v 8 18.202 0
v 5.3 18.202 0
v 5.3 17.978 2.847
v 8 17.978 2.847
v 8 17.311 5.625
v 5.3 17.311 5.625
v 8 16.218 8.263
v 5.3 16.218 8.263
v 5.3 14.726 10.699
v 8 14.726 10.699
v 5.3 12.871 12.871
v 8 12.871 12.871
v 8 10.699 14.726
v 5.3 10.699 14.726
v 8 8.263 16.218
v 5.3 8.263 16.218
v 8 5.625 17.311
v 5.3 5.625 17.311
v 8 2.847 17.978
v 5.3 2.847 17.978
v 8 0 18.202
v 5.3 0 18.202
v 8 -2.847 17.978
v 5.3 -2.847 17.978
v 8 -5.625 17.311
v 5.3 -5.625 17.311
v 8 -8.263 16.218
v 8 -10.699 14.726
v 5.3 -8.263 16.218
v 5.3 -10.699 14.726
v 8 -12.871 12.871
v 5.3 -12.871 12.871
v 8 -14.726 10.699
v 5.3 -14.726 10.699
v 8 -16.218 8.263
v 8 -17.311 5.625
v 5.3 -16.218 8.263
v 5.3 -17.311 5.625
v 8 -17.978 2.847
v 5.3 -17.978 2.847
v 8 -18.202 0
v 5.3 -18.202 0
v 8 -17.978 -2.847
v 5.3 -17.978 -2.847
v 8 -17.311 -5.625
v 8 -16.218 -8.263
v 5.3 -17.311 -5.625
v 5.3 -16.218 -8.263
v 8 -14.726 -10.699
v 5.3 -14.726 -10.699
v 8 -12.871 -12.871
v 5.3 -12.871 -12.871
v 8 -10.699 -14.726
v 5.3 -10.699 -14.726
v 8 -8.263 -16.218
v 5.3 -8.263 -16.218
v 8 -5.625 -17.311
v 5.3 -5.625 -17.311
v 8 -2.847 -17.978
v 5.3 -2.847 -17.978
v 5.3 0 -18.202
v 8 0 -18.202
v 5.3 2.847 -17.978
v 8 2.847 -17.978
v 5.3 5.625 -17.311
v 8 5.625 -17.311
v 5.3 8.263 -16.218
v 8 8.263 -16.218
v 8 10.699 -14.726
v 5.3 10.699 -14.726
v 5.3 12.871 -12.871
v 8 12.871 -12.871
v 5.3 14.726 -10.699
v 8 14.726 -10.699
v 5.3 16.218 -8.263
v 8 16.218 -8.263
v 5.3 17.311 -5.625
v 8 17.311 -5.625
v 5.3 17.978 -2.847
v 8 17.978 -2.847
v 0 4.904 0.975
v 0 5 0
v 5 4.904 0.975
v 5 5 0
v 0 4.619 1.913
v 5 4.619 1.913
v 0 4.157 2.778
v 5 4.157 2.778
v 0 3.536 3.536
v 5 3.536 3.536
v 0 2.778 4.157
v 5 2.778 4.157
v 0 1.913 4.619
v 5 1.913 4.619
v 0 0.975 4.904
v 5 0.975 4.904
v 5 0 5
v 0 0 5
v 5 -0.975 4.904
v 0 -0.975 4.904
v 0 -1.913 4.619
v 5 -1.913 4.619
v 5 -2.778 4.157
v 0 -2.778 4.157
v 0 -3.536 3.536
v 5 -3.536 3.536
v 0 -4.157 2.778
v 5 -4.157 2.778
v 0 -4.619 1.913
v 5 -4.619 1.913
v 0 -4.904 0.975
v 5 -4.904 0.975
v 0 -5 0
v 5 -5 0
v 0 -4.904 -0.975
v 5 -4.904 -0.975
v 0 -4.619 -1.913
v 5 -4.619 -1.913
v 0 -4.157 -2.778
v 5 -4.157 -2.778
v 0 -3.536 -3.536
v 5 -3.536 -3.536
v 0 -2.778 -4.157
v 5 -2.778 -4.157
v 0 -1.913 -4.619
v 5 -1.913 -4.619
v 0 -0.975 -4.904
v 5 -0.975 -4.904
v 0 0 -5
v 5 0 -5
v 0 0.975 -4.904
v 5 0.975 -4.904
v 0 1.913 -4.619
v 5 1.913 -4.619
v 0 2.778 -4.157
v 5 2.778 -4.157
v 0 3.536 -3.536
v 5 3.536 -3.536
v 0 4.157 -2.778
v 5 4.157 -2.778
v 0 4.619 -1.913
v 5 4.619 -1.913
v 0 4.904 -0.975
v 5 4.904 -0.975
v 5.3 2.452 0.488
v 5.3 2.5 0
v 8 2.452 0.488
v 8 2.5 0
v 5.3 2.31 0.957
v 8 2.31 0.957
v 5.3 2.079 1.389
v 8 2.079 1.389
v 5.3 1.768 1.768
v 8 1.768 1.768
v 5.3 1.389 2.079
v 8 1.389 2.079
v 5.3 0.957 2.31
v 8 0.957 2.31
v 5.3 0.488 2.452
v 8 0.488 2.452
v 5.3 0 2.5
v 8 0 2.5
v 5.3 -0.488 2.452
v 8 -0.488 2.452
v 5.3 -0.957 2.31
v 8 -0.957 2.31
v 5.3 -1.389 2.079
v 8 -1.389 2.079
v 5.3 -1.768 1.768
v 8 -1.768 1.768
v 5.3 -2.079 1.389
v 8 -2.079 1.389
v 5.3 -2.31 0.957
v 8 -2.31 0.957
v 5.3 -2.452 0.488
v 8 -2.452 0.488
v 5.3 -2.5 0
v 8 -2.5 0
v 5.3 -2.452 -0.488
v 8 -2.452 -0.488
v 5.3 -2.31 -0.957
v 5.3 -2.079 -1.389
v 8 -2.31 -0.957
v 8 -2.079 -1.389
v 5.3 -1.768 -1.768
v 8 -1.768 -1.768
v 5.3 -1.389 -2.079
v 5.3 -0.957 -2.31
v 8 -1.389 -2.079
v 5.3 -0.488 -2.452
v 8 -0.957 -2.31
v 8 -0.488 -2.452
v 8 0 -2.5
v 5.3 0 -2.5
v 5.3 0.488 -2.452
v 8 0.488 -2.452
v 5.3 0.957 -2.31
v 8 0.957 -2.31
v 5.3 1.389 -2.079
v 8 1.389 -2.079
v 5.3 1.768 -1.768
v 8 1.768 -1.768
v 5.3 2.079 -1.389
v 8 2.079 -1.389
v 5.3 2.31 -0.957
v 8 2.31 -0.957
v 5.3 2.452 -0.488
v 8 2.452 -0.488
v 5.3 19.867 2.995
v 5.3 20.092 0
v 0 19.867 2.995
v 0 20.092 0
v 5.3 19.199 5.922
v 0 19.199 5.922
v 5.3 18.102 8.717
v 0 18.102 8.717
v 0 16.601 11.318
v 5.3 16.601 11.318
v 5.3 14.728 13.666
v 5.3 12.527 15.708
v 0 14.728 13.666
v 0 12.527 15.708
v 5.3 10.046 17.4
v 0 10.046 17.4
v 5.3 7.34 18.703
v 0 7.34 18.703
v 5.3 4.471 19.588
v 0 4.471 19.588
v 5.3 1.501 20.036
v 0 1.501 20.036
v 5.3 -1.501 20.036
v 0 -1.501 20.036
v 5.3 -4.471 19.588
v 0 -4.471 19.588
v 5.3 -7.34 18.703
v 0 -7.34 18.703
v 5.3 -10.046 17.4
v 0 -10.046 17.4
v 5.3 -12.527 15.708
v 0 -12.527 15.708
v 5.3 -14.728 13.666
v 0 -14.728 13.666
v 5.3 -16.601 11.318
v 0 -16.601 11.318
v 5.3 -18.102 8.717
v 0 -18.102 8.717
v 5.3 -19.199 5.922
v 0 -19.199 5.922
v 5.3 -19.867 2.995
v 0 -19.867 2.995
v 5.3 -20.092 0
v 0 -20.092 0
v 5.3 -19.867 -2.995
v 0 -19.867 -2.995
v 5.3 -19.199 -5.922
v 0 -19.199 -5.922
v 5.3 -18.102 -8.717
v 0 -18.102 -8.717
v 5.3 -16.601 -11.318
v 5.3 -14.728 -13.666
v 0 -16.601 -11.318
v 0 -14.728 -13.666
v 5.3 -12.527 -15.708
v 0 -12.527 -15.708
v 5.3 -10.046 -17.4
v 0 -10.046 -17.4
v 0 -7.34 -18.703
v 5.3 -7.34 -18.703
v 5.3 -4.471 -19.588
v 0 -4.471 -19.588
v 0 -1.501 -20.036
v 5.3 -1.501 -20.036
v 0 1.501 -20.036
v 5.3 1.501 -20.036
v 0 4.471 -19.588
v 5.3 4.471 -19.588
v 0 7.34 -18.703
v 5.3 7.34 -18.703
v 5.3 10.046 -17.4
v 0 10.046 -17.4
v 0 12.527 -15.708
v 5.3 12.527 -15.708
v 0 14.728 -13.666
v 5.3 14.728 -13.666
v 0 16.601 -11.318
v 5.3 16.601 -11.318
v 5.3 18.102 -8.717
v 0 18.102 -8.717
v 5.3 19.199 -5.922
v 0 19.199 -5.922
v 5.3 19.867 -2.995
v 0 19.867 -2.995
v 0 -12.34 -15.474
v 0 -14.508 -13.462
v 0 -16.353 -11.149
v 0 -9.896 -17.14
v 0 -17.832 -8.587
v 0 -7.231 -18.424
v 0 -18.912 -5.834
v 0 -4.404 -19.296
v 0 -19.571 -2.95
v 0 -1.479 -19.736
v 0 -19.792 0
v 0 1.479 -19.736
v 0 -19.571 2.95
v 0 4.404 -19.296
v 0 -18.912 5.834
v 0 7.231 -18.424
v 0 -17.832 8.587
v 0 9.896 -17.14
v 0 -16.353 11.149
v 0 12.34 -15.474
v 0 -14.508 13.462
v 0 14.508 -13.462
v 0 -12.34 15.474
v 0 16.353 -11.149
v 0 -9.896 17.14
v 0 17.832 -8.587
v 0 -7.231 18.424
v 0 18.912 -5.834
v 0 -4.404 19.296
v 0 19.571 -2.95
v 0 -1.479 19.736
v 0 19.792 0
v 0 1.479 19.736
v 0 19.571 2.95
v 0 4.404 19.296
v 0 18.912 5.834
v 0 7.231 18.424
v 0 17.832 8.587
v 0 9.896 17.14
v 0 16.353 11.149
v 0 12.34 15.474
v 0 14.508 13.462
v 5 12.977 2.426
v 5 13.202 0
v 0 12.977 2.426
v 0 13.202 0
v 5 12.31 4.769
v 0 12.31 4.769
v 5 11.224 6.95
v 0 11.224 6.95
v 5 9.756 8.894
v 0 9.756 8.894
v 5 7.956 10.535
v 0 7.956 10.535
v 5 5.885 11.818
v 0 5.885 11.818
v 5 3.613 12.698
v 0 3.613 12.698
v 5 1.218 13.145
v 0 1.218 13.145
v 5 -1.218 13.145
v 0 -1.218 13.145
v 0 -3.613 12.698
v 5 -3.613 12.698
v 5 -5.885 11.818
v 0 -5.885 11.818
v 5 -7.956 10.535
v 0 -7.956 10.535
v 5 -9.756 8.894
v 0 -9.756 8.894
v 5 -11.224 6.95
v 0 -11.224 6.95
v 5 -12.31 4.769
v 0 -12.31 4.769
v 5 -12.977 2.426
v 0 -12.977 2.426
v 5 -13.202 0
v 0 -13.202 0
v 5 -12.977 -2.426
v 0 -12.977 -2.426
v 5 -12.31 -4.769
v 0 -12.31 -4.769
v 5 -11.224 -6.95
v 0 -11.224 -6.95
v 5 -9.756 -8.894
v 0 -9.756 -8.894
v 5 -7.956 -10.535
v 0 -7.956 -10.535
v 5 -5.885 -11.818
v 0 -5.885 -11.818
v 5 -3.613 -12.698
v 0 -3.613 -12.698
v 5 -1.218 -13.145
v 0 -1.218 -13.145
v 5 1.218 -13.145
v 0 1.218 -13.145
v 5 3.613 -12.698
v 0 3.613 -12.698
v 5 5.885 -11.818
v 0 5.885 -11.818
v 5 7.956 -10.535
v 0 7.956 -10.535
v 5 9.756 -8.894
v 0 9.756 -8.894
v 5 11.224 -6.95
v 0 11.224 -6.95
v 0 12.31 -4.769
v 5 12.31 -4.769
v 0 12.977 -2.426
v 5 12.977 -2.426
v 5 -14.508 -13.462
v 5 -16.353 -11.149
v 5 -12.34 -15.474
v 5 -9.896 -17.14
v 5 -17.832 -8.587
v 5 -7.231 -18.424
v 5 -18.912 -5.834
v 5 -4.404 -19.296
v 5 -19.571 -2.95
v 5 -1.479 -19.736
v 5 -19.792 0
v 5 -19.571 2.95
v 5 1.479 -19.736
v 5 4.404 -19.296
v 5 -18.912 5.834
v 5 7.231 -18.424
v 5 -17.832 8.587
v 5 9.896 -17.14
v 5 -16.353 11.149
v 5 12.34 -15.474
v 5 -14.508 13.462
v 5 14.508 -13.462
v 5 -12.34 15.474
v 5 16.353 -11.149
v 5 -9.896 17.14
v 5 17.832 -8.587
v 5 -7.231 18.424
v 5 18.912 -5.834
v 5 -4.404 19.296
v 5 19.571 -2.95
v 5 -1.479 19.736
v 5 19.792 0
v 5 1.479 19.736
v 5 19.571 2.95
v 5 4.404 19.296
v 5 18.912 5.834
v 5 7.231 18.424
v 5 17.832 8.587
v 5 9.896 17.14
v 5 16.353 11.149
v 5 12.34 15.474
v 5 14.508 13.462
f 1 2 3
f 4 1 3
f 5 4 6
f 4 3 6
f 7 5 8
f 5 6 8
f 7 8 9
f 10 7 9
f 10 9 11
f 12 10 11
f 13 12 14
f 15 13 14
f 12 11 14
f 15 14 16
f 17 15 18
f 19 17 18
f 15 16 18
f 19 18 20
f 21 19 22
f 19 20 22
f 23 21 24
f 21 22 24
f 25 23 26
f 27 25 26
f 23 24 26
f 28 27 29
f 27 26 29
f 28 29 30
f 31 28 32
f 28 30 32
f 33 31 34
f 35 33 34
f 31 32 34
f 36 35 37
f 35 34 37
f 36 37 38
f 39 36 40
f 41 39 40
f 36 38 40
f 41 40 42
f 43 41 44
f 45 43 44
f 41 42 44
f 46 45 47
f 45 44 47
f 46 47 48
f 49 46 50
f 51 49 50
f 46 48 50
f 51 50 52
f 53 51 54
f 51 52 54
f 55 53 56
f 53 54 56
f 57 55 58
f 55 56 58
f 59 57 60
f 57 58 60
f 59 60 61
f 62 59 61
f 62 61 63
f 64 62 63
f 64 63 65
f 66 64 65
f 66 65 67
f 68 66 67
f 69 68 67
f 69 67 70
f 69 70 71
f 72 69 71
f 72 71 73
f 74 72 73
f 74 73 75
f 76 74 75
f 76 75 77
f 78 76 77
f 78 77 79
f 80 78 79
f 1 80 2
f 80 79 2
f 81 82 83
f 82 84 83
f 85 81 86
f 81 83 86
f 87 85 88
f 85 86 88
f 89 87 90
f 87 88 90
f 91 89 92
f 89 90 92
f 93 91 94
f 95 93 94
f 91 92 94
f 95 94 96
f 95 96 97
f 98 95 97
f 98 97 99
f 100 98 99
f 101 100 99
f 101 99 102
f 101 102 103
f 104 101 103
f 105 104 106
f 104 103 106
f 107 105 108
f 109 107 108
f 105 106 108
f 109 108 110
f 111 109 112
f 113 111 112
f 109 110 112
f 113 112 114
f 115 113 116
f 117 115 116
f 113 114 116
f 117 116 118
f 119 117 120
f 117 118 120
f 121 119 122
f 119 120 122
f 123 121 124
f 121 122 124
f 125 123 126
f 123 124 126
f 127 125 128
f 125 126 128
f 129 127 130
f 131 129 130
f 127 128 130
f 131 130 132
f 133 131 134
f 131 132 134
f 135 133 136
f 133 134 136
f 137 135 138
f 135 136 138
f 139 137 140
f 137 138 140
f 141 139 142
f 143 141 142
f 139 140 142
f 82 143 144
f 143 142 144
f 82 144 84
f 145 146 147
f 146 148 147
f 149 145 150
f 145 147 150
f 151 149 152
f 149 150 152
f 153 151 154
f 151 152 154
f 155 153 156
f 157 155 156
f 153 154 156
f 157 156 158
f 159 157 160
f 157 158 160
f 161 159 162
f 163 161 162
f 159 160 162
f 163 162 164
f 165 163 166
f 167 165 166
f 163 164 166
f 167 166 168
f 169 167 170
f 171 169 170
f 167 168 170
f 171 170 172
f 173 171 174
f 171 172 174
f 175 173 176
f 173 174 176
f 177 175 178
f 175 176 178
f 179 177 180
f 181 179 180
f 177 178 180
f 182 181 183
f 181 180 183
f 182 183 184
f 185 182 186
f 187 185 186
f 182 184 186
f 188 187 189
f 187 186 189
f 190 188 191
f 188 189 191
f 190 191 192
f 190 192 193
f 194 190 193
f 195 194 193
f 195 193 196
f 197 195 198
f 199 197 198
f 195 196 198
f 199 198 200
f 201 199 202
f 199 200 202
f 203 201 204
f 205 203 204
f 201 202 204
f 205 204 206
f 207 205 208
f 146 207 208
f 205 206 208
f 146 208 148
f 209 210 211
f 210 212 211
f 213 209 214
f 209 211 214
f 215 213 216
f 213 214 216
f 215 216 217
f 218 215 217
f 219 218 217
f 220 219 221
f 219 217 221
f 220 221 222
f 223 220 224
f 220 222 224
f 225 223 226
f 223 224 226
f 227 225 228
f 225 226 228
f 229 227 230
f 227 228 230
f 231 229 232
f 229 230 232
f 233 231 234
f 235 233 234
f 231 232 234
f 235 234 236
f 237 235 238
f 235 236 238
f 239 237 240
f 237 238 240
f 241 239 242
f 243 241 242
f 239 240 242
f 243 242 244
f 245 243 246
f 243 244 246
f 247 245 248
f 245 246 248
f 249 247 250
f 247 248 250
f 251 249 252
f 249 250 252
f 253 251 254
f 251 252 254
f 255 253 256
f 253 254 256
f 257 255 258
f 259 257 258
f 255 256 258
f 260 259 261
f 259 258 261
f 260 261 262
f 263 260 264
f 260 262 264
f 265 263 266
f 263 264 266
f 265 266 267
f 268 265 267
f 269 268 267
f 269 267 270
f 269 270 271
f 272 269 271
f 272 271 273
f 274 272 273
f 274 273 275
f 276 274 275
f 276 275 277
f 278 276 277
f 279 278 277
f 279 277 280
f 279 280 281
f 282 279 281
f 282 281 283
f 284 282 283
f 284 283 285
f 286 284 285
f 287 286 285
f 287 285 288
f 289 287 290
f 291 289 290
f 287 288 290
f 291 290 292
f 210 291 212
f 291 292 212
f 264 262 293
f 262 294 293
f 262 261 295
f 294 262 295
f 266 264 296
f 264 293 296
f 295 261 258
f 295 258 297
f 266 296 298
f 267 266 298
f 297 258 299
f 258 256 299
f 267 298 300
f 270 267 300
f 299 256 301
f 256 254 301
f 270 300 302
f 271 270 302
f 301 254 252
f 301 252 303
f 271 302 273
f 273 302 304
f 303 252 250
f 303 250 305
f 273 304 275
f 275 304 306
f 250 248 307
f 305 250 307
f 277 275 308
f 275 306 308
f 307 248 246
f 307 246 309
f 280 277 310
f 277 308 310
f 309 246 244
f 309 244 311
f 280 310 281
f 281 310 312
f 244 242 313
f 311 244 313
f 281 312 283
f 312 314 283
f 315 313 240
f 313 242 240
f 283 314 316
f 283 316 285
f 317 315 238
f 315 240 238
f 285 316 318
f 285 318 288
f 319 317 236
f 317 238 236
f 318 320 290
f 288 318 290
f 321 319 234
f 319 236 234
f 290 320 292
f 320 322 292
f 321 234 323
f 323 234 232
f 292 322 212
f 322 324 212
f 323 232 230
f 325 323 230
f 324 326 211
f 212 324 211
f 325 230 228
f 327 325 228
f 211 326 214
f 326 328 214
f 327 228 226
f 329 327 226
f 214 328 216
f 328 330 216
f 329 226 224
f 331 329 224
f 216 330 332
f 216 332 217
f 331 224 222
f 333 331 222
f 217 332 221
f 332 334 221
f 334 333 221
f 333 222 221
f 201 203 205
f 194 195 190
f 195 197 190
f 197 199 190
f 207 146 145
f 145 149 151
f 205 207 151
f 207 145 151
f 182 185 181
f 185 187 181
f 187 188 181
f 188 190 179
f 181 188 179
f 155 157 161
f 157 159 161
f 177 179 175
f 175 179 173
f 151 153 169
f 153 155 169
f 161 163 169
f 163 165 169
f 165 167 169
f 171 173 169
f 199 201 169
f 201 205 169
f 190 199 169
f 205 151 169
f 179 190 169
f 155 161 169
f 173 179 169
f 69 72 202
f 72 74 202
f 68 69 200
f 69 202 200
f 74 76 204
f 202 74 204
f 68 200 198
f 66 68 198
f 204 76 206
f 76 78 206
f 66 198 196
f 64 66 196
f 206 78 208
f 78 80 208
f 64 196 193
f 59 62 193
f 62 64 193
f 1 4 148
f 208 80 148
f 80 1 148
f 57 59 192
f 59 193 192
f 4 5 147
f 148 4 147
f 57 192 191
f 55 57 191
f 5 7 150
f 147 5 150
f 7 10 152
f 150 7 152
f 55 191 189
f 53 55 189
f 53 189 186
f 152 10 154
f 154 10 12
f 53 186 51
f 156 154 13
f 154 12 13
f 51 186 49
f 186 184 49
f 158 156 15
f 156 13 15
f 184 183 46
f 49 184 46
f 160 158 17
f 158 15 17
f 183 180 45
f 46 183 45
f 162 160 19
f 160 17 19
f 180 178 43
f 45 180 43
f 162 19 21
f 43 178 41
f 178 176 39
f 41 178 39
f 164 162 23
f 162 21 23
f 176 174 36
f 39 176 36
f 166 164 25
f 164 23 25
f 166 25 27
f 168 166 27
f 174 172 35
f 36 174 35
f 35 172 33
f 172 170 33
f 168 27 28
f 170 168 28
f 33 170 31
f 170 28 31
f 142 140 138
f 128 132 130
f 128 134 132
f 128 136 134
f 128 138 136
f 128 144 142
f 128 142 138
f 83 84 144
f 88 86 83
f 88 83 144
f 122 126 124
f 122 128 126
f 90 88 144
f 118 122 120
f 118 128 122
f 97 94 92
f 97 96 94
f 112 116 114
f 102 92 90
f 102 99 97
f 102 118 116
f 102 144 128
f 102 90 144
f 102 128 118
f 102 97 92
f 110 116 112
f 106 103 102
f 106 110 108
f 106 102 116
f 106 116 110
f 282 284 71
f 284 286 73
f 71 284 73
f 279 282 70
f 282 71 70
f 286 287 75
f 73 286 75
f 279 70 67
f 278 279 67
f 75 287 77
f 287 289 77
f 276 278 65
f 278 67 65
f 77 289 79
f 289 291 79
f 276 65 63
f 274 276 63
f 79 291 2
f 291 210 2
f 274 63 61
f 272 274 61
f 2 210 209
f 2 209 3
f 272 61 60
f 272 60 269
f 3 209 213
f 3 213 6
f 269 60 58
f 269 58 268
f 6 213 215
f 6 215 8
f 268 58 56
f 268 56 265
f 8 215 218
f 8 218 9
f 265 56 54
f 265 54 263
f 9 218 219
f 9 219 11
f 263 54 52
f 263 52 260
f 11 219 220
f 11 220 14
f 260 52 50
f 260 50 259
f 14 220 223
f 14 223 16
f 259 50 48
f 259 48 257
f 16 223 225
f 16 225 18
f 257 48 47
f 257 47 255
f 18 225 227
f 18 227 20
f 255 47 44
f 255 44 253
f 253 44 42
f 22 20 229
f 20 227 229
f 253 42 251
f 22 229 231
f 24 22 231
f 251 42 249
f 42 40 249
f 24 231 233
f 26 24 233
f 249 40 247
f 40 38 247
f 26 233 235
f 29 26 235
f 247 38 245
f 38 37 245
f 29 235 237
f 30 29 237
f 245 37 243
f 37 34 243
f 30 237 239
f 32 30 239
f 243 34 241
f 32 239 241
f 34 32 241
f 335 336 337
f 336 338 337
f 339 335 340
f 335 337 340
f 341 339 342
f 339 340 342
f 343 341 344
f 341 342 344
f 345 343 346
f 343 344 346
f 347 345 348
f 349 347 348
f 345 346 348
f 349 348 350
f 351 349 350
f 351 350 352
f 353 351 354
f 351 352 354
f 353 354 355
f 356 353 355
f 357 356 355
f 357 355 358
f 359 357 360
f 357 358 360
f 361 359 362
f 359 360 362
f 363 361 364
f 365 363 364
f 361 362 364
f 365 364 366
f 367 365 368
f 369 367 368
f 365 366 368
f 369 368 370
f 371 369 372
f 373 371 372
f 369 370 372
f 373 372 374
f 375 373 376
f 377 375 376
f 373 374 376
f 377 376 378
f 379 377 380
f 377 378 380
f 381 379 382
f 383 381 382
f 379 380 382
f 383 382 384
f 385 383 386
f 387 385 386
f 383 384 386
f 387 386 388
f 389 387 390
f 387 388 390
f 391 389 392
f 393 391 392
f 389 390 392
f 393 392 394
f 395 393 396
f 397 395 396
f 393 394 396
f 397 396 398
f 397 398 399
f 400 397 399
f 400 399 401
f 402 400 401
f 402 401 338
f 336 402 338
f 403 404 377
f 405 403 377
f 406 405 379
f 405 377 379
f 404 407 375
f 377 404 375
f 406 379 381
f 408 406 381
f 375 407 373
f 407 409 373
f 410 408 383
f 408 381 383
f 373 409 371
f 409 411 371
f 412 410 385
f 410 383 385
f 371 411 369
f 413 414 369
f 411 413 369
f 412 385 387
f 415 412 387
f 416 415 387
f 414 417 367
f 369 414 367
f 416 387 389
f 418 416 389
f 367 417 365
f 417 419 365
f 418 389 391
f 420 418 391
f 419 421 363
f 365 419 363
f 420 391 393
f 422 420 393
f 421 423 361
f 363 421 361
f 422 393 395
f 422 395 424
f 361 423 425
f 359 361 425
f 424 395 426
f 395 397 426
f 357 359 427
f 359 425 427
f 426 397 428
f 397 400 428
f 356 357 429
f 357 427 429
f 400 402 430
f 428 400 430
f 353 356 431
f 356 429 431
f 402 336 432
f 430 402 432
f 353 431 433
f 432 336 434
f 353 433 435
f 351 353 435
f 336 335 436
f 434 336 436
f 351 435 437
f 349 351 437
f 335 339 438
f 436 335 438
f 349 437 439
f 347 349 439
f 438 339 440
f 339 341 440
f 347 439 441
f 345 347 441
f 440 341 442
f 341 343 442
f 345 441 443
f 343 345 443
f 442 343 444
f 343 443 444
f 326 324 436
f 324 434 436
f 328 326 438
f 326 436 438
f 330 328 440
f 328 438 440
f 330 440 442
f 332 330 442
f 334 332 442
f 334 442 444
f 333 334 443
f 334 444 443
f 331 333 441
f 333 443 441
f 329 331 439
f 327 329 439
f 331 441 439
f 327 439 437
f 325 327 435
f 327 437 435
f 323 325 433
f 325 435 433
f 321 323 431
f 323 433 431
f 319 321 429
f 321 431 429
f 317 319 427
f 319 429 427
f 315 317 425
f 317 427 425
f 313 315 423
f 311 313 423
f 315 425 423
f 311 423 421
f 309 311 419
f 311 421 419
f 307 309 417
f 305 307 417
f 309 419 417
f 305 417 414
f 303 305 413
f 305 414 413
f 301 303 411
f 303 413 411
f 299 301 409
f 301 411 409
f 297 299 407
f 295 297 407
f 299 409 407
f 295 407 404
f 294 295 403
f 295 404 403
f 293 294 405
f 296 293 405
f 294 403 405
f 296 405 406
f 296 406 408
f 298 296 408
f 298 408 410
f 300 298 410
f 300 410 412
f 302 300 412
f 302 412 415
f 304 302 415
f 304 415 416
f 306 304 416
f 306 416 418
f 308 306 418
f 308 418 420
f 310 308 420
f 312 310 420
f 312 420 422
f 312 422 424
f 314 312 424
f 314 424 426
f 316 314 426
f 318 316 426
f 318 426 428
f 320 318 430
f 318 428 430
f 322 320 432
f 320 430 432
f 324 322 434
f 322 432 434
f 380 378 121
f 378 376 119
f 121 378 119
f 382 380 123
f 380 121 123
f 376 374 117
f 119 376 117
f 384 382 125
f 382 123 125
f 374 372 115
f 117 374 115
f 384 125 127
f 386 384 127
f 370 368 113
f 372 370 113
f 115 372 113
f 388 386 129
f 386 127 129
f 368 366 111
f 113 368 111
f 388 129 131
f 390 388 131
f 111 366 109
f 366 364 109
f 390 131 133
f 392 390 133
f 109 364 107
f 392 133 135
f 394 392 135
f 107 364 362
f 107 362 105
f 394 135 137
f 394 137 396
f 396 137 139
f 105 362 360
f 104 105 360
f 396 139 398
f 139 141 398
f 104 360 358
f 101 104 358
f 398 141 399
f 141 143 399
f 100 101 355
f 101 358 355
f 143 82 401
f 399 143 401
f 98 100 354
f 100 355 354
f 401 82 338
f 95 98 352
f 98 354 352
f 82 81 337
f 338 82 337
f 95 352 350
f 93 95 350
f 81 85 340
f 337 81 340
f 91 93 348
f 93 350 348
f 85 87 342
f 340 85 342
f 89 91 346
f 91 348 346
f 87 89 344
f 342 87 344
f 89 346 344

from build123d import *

# Parameters (mm, degrees)
F1_W = 0.3
F1_H = 2.5


with BuildPart() as f3:
    # F0 (on Top) → F3 (revolve)
    with BuildSketch(Plane.XY):
        Polygon((0, 13.201755), (0, 5), (5, 5), (5, 2.5), (8, 2.5), (8, 18.201755), (5, 18.201755), (5, 13.201755), align=None)
    revolve(axis=Axis((9.429826, 0, 0), (1, 0, 0)))

    # F1 (on Top) → F4 (revolve)
    with BuildSketch(Plane.XY):
        with Locations((5.15, 1.25)):
            Rectangle(F1_W, F1_H)
        Polygon((5, 19.791724), (5, 18.201755), (5.3, 18.201755), (5.3, 20.091724), (0, 20.091724), (0, 19.791724), align=None)
    revolve(axis=Axis((9.429826, 0, 0), (1, 0, 0)))


solid = f3.part
